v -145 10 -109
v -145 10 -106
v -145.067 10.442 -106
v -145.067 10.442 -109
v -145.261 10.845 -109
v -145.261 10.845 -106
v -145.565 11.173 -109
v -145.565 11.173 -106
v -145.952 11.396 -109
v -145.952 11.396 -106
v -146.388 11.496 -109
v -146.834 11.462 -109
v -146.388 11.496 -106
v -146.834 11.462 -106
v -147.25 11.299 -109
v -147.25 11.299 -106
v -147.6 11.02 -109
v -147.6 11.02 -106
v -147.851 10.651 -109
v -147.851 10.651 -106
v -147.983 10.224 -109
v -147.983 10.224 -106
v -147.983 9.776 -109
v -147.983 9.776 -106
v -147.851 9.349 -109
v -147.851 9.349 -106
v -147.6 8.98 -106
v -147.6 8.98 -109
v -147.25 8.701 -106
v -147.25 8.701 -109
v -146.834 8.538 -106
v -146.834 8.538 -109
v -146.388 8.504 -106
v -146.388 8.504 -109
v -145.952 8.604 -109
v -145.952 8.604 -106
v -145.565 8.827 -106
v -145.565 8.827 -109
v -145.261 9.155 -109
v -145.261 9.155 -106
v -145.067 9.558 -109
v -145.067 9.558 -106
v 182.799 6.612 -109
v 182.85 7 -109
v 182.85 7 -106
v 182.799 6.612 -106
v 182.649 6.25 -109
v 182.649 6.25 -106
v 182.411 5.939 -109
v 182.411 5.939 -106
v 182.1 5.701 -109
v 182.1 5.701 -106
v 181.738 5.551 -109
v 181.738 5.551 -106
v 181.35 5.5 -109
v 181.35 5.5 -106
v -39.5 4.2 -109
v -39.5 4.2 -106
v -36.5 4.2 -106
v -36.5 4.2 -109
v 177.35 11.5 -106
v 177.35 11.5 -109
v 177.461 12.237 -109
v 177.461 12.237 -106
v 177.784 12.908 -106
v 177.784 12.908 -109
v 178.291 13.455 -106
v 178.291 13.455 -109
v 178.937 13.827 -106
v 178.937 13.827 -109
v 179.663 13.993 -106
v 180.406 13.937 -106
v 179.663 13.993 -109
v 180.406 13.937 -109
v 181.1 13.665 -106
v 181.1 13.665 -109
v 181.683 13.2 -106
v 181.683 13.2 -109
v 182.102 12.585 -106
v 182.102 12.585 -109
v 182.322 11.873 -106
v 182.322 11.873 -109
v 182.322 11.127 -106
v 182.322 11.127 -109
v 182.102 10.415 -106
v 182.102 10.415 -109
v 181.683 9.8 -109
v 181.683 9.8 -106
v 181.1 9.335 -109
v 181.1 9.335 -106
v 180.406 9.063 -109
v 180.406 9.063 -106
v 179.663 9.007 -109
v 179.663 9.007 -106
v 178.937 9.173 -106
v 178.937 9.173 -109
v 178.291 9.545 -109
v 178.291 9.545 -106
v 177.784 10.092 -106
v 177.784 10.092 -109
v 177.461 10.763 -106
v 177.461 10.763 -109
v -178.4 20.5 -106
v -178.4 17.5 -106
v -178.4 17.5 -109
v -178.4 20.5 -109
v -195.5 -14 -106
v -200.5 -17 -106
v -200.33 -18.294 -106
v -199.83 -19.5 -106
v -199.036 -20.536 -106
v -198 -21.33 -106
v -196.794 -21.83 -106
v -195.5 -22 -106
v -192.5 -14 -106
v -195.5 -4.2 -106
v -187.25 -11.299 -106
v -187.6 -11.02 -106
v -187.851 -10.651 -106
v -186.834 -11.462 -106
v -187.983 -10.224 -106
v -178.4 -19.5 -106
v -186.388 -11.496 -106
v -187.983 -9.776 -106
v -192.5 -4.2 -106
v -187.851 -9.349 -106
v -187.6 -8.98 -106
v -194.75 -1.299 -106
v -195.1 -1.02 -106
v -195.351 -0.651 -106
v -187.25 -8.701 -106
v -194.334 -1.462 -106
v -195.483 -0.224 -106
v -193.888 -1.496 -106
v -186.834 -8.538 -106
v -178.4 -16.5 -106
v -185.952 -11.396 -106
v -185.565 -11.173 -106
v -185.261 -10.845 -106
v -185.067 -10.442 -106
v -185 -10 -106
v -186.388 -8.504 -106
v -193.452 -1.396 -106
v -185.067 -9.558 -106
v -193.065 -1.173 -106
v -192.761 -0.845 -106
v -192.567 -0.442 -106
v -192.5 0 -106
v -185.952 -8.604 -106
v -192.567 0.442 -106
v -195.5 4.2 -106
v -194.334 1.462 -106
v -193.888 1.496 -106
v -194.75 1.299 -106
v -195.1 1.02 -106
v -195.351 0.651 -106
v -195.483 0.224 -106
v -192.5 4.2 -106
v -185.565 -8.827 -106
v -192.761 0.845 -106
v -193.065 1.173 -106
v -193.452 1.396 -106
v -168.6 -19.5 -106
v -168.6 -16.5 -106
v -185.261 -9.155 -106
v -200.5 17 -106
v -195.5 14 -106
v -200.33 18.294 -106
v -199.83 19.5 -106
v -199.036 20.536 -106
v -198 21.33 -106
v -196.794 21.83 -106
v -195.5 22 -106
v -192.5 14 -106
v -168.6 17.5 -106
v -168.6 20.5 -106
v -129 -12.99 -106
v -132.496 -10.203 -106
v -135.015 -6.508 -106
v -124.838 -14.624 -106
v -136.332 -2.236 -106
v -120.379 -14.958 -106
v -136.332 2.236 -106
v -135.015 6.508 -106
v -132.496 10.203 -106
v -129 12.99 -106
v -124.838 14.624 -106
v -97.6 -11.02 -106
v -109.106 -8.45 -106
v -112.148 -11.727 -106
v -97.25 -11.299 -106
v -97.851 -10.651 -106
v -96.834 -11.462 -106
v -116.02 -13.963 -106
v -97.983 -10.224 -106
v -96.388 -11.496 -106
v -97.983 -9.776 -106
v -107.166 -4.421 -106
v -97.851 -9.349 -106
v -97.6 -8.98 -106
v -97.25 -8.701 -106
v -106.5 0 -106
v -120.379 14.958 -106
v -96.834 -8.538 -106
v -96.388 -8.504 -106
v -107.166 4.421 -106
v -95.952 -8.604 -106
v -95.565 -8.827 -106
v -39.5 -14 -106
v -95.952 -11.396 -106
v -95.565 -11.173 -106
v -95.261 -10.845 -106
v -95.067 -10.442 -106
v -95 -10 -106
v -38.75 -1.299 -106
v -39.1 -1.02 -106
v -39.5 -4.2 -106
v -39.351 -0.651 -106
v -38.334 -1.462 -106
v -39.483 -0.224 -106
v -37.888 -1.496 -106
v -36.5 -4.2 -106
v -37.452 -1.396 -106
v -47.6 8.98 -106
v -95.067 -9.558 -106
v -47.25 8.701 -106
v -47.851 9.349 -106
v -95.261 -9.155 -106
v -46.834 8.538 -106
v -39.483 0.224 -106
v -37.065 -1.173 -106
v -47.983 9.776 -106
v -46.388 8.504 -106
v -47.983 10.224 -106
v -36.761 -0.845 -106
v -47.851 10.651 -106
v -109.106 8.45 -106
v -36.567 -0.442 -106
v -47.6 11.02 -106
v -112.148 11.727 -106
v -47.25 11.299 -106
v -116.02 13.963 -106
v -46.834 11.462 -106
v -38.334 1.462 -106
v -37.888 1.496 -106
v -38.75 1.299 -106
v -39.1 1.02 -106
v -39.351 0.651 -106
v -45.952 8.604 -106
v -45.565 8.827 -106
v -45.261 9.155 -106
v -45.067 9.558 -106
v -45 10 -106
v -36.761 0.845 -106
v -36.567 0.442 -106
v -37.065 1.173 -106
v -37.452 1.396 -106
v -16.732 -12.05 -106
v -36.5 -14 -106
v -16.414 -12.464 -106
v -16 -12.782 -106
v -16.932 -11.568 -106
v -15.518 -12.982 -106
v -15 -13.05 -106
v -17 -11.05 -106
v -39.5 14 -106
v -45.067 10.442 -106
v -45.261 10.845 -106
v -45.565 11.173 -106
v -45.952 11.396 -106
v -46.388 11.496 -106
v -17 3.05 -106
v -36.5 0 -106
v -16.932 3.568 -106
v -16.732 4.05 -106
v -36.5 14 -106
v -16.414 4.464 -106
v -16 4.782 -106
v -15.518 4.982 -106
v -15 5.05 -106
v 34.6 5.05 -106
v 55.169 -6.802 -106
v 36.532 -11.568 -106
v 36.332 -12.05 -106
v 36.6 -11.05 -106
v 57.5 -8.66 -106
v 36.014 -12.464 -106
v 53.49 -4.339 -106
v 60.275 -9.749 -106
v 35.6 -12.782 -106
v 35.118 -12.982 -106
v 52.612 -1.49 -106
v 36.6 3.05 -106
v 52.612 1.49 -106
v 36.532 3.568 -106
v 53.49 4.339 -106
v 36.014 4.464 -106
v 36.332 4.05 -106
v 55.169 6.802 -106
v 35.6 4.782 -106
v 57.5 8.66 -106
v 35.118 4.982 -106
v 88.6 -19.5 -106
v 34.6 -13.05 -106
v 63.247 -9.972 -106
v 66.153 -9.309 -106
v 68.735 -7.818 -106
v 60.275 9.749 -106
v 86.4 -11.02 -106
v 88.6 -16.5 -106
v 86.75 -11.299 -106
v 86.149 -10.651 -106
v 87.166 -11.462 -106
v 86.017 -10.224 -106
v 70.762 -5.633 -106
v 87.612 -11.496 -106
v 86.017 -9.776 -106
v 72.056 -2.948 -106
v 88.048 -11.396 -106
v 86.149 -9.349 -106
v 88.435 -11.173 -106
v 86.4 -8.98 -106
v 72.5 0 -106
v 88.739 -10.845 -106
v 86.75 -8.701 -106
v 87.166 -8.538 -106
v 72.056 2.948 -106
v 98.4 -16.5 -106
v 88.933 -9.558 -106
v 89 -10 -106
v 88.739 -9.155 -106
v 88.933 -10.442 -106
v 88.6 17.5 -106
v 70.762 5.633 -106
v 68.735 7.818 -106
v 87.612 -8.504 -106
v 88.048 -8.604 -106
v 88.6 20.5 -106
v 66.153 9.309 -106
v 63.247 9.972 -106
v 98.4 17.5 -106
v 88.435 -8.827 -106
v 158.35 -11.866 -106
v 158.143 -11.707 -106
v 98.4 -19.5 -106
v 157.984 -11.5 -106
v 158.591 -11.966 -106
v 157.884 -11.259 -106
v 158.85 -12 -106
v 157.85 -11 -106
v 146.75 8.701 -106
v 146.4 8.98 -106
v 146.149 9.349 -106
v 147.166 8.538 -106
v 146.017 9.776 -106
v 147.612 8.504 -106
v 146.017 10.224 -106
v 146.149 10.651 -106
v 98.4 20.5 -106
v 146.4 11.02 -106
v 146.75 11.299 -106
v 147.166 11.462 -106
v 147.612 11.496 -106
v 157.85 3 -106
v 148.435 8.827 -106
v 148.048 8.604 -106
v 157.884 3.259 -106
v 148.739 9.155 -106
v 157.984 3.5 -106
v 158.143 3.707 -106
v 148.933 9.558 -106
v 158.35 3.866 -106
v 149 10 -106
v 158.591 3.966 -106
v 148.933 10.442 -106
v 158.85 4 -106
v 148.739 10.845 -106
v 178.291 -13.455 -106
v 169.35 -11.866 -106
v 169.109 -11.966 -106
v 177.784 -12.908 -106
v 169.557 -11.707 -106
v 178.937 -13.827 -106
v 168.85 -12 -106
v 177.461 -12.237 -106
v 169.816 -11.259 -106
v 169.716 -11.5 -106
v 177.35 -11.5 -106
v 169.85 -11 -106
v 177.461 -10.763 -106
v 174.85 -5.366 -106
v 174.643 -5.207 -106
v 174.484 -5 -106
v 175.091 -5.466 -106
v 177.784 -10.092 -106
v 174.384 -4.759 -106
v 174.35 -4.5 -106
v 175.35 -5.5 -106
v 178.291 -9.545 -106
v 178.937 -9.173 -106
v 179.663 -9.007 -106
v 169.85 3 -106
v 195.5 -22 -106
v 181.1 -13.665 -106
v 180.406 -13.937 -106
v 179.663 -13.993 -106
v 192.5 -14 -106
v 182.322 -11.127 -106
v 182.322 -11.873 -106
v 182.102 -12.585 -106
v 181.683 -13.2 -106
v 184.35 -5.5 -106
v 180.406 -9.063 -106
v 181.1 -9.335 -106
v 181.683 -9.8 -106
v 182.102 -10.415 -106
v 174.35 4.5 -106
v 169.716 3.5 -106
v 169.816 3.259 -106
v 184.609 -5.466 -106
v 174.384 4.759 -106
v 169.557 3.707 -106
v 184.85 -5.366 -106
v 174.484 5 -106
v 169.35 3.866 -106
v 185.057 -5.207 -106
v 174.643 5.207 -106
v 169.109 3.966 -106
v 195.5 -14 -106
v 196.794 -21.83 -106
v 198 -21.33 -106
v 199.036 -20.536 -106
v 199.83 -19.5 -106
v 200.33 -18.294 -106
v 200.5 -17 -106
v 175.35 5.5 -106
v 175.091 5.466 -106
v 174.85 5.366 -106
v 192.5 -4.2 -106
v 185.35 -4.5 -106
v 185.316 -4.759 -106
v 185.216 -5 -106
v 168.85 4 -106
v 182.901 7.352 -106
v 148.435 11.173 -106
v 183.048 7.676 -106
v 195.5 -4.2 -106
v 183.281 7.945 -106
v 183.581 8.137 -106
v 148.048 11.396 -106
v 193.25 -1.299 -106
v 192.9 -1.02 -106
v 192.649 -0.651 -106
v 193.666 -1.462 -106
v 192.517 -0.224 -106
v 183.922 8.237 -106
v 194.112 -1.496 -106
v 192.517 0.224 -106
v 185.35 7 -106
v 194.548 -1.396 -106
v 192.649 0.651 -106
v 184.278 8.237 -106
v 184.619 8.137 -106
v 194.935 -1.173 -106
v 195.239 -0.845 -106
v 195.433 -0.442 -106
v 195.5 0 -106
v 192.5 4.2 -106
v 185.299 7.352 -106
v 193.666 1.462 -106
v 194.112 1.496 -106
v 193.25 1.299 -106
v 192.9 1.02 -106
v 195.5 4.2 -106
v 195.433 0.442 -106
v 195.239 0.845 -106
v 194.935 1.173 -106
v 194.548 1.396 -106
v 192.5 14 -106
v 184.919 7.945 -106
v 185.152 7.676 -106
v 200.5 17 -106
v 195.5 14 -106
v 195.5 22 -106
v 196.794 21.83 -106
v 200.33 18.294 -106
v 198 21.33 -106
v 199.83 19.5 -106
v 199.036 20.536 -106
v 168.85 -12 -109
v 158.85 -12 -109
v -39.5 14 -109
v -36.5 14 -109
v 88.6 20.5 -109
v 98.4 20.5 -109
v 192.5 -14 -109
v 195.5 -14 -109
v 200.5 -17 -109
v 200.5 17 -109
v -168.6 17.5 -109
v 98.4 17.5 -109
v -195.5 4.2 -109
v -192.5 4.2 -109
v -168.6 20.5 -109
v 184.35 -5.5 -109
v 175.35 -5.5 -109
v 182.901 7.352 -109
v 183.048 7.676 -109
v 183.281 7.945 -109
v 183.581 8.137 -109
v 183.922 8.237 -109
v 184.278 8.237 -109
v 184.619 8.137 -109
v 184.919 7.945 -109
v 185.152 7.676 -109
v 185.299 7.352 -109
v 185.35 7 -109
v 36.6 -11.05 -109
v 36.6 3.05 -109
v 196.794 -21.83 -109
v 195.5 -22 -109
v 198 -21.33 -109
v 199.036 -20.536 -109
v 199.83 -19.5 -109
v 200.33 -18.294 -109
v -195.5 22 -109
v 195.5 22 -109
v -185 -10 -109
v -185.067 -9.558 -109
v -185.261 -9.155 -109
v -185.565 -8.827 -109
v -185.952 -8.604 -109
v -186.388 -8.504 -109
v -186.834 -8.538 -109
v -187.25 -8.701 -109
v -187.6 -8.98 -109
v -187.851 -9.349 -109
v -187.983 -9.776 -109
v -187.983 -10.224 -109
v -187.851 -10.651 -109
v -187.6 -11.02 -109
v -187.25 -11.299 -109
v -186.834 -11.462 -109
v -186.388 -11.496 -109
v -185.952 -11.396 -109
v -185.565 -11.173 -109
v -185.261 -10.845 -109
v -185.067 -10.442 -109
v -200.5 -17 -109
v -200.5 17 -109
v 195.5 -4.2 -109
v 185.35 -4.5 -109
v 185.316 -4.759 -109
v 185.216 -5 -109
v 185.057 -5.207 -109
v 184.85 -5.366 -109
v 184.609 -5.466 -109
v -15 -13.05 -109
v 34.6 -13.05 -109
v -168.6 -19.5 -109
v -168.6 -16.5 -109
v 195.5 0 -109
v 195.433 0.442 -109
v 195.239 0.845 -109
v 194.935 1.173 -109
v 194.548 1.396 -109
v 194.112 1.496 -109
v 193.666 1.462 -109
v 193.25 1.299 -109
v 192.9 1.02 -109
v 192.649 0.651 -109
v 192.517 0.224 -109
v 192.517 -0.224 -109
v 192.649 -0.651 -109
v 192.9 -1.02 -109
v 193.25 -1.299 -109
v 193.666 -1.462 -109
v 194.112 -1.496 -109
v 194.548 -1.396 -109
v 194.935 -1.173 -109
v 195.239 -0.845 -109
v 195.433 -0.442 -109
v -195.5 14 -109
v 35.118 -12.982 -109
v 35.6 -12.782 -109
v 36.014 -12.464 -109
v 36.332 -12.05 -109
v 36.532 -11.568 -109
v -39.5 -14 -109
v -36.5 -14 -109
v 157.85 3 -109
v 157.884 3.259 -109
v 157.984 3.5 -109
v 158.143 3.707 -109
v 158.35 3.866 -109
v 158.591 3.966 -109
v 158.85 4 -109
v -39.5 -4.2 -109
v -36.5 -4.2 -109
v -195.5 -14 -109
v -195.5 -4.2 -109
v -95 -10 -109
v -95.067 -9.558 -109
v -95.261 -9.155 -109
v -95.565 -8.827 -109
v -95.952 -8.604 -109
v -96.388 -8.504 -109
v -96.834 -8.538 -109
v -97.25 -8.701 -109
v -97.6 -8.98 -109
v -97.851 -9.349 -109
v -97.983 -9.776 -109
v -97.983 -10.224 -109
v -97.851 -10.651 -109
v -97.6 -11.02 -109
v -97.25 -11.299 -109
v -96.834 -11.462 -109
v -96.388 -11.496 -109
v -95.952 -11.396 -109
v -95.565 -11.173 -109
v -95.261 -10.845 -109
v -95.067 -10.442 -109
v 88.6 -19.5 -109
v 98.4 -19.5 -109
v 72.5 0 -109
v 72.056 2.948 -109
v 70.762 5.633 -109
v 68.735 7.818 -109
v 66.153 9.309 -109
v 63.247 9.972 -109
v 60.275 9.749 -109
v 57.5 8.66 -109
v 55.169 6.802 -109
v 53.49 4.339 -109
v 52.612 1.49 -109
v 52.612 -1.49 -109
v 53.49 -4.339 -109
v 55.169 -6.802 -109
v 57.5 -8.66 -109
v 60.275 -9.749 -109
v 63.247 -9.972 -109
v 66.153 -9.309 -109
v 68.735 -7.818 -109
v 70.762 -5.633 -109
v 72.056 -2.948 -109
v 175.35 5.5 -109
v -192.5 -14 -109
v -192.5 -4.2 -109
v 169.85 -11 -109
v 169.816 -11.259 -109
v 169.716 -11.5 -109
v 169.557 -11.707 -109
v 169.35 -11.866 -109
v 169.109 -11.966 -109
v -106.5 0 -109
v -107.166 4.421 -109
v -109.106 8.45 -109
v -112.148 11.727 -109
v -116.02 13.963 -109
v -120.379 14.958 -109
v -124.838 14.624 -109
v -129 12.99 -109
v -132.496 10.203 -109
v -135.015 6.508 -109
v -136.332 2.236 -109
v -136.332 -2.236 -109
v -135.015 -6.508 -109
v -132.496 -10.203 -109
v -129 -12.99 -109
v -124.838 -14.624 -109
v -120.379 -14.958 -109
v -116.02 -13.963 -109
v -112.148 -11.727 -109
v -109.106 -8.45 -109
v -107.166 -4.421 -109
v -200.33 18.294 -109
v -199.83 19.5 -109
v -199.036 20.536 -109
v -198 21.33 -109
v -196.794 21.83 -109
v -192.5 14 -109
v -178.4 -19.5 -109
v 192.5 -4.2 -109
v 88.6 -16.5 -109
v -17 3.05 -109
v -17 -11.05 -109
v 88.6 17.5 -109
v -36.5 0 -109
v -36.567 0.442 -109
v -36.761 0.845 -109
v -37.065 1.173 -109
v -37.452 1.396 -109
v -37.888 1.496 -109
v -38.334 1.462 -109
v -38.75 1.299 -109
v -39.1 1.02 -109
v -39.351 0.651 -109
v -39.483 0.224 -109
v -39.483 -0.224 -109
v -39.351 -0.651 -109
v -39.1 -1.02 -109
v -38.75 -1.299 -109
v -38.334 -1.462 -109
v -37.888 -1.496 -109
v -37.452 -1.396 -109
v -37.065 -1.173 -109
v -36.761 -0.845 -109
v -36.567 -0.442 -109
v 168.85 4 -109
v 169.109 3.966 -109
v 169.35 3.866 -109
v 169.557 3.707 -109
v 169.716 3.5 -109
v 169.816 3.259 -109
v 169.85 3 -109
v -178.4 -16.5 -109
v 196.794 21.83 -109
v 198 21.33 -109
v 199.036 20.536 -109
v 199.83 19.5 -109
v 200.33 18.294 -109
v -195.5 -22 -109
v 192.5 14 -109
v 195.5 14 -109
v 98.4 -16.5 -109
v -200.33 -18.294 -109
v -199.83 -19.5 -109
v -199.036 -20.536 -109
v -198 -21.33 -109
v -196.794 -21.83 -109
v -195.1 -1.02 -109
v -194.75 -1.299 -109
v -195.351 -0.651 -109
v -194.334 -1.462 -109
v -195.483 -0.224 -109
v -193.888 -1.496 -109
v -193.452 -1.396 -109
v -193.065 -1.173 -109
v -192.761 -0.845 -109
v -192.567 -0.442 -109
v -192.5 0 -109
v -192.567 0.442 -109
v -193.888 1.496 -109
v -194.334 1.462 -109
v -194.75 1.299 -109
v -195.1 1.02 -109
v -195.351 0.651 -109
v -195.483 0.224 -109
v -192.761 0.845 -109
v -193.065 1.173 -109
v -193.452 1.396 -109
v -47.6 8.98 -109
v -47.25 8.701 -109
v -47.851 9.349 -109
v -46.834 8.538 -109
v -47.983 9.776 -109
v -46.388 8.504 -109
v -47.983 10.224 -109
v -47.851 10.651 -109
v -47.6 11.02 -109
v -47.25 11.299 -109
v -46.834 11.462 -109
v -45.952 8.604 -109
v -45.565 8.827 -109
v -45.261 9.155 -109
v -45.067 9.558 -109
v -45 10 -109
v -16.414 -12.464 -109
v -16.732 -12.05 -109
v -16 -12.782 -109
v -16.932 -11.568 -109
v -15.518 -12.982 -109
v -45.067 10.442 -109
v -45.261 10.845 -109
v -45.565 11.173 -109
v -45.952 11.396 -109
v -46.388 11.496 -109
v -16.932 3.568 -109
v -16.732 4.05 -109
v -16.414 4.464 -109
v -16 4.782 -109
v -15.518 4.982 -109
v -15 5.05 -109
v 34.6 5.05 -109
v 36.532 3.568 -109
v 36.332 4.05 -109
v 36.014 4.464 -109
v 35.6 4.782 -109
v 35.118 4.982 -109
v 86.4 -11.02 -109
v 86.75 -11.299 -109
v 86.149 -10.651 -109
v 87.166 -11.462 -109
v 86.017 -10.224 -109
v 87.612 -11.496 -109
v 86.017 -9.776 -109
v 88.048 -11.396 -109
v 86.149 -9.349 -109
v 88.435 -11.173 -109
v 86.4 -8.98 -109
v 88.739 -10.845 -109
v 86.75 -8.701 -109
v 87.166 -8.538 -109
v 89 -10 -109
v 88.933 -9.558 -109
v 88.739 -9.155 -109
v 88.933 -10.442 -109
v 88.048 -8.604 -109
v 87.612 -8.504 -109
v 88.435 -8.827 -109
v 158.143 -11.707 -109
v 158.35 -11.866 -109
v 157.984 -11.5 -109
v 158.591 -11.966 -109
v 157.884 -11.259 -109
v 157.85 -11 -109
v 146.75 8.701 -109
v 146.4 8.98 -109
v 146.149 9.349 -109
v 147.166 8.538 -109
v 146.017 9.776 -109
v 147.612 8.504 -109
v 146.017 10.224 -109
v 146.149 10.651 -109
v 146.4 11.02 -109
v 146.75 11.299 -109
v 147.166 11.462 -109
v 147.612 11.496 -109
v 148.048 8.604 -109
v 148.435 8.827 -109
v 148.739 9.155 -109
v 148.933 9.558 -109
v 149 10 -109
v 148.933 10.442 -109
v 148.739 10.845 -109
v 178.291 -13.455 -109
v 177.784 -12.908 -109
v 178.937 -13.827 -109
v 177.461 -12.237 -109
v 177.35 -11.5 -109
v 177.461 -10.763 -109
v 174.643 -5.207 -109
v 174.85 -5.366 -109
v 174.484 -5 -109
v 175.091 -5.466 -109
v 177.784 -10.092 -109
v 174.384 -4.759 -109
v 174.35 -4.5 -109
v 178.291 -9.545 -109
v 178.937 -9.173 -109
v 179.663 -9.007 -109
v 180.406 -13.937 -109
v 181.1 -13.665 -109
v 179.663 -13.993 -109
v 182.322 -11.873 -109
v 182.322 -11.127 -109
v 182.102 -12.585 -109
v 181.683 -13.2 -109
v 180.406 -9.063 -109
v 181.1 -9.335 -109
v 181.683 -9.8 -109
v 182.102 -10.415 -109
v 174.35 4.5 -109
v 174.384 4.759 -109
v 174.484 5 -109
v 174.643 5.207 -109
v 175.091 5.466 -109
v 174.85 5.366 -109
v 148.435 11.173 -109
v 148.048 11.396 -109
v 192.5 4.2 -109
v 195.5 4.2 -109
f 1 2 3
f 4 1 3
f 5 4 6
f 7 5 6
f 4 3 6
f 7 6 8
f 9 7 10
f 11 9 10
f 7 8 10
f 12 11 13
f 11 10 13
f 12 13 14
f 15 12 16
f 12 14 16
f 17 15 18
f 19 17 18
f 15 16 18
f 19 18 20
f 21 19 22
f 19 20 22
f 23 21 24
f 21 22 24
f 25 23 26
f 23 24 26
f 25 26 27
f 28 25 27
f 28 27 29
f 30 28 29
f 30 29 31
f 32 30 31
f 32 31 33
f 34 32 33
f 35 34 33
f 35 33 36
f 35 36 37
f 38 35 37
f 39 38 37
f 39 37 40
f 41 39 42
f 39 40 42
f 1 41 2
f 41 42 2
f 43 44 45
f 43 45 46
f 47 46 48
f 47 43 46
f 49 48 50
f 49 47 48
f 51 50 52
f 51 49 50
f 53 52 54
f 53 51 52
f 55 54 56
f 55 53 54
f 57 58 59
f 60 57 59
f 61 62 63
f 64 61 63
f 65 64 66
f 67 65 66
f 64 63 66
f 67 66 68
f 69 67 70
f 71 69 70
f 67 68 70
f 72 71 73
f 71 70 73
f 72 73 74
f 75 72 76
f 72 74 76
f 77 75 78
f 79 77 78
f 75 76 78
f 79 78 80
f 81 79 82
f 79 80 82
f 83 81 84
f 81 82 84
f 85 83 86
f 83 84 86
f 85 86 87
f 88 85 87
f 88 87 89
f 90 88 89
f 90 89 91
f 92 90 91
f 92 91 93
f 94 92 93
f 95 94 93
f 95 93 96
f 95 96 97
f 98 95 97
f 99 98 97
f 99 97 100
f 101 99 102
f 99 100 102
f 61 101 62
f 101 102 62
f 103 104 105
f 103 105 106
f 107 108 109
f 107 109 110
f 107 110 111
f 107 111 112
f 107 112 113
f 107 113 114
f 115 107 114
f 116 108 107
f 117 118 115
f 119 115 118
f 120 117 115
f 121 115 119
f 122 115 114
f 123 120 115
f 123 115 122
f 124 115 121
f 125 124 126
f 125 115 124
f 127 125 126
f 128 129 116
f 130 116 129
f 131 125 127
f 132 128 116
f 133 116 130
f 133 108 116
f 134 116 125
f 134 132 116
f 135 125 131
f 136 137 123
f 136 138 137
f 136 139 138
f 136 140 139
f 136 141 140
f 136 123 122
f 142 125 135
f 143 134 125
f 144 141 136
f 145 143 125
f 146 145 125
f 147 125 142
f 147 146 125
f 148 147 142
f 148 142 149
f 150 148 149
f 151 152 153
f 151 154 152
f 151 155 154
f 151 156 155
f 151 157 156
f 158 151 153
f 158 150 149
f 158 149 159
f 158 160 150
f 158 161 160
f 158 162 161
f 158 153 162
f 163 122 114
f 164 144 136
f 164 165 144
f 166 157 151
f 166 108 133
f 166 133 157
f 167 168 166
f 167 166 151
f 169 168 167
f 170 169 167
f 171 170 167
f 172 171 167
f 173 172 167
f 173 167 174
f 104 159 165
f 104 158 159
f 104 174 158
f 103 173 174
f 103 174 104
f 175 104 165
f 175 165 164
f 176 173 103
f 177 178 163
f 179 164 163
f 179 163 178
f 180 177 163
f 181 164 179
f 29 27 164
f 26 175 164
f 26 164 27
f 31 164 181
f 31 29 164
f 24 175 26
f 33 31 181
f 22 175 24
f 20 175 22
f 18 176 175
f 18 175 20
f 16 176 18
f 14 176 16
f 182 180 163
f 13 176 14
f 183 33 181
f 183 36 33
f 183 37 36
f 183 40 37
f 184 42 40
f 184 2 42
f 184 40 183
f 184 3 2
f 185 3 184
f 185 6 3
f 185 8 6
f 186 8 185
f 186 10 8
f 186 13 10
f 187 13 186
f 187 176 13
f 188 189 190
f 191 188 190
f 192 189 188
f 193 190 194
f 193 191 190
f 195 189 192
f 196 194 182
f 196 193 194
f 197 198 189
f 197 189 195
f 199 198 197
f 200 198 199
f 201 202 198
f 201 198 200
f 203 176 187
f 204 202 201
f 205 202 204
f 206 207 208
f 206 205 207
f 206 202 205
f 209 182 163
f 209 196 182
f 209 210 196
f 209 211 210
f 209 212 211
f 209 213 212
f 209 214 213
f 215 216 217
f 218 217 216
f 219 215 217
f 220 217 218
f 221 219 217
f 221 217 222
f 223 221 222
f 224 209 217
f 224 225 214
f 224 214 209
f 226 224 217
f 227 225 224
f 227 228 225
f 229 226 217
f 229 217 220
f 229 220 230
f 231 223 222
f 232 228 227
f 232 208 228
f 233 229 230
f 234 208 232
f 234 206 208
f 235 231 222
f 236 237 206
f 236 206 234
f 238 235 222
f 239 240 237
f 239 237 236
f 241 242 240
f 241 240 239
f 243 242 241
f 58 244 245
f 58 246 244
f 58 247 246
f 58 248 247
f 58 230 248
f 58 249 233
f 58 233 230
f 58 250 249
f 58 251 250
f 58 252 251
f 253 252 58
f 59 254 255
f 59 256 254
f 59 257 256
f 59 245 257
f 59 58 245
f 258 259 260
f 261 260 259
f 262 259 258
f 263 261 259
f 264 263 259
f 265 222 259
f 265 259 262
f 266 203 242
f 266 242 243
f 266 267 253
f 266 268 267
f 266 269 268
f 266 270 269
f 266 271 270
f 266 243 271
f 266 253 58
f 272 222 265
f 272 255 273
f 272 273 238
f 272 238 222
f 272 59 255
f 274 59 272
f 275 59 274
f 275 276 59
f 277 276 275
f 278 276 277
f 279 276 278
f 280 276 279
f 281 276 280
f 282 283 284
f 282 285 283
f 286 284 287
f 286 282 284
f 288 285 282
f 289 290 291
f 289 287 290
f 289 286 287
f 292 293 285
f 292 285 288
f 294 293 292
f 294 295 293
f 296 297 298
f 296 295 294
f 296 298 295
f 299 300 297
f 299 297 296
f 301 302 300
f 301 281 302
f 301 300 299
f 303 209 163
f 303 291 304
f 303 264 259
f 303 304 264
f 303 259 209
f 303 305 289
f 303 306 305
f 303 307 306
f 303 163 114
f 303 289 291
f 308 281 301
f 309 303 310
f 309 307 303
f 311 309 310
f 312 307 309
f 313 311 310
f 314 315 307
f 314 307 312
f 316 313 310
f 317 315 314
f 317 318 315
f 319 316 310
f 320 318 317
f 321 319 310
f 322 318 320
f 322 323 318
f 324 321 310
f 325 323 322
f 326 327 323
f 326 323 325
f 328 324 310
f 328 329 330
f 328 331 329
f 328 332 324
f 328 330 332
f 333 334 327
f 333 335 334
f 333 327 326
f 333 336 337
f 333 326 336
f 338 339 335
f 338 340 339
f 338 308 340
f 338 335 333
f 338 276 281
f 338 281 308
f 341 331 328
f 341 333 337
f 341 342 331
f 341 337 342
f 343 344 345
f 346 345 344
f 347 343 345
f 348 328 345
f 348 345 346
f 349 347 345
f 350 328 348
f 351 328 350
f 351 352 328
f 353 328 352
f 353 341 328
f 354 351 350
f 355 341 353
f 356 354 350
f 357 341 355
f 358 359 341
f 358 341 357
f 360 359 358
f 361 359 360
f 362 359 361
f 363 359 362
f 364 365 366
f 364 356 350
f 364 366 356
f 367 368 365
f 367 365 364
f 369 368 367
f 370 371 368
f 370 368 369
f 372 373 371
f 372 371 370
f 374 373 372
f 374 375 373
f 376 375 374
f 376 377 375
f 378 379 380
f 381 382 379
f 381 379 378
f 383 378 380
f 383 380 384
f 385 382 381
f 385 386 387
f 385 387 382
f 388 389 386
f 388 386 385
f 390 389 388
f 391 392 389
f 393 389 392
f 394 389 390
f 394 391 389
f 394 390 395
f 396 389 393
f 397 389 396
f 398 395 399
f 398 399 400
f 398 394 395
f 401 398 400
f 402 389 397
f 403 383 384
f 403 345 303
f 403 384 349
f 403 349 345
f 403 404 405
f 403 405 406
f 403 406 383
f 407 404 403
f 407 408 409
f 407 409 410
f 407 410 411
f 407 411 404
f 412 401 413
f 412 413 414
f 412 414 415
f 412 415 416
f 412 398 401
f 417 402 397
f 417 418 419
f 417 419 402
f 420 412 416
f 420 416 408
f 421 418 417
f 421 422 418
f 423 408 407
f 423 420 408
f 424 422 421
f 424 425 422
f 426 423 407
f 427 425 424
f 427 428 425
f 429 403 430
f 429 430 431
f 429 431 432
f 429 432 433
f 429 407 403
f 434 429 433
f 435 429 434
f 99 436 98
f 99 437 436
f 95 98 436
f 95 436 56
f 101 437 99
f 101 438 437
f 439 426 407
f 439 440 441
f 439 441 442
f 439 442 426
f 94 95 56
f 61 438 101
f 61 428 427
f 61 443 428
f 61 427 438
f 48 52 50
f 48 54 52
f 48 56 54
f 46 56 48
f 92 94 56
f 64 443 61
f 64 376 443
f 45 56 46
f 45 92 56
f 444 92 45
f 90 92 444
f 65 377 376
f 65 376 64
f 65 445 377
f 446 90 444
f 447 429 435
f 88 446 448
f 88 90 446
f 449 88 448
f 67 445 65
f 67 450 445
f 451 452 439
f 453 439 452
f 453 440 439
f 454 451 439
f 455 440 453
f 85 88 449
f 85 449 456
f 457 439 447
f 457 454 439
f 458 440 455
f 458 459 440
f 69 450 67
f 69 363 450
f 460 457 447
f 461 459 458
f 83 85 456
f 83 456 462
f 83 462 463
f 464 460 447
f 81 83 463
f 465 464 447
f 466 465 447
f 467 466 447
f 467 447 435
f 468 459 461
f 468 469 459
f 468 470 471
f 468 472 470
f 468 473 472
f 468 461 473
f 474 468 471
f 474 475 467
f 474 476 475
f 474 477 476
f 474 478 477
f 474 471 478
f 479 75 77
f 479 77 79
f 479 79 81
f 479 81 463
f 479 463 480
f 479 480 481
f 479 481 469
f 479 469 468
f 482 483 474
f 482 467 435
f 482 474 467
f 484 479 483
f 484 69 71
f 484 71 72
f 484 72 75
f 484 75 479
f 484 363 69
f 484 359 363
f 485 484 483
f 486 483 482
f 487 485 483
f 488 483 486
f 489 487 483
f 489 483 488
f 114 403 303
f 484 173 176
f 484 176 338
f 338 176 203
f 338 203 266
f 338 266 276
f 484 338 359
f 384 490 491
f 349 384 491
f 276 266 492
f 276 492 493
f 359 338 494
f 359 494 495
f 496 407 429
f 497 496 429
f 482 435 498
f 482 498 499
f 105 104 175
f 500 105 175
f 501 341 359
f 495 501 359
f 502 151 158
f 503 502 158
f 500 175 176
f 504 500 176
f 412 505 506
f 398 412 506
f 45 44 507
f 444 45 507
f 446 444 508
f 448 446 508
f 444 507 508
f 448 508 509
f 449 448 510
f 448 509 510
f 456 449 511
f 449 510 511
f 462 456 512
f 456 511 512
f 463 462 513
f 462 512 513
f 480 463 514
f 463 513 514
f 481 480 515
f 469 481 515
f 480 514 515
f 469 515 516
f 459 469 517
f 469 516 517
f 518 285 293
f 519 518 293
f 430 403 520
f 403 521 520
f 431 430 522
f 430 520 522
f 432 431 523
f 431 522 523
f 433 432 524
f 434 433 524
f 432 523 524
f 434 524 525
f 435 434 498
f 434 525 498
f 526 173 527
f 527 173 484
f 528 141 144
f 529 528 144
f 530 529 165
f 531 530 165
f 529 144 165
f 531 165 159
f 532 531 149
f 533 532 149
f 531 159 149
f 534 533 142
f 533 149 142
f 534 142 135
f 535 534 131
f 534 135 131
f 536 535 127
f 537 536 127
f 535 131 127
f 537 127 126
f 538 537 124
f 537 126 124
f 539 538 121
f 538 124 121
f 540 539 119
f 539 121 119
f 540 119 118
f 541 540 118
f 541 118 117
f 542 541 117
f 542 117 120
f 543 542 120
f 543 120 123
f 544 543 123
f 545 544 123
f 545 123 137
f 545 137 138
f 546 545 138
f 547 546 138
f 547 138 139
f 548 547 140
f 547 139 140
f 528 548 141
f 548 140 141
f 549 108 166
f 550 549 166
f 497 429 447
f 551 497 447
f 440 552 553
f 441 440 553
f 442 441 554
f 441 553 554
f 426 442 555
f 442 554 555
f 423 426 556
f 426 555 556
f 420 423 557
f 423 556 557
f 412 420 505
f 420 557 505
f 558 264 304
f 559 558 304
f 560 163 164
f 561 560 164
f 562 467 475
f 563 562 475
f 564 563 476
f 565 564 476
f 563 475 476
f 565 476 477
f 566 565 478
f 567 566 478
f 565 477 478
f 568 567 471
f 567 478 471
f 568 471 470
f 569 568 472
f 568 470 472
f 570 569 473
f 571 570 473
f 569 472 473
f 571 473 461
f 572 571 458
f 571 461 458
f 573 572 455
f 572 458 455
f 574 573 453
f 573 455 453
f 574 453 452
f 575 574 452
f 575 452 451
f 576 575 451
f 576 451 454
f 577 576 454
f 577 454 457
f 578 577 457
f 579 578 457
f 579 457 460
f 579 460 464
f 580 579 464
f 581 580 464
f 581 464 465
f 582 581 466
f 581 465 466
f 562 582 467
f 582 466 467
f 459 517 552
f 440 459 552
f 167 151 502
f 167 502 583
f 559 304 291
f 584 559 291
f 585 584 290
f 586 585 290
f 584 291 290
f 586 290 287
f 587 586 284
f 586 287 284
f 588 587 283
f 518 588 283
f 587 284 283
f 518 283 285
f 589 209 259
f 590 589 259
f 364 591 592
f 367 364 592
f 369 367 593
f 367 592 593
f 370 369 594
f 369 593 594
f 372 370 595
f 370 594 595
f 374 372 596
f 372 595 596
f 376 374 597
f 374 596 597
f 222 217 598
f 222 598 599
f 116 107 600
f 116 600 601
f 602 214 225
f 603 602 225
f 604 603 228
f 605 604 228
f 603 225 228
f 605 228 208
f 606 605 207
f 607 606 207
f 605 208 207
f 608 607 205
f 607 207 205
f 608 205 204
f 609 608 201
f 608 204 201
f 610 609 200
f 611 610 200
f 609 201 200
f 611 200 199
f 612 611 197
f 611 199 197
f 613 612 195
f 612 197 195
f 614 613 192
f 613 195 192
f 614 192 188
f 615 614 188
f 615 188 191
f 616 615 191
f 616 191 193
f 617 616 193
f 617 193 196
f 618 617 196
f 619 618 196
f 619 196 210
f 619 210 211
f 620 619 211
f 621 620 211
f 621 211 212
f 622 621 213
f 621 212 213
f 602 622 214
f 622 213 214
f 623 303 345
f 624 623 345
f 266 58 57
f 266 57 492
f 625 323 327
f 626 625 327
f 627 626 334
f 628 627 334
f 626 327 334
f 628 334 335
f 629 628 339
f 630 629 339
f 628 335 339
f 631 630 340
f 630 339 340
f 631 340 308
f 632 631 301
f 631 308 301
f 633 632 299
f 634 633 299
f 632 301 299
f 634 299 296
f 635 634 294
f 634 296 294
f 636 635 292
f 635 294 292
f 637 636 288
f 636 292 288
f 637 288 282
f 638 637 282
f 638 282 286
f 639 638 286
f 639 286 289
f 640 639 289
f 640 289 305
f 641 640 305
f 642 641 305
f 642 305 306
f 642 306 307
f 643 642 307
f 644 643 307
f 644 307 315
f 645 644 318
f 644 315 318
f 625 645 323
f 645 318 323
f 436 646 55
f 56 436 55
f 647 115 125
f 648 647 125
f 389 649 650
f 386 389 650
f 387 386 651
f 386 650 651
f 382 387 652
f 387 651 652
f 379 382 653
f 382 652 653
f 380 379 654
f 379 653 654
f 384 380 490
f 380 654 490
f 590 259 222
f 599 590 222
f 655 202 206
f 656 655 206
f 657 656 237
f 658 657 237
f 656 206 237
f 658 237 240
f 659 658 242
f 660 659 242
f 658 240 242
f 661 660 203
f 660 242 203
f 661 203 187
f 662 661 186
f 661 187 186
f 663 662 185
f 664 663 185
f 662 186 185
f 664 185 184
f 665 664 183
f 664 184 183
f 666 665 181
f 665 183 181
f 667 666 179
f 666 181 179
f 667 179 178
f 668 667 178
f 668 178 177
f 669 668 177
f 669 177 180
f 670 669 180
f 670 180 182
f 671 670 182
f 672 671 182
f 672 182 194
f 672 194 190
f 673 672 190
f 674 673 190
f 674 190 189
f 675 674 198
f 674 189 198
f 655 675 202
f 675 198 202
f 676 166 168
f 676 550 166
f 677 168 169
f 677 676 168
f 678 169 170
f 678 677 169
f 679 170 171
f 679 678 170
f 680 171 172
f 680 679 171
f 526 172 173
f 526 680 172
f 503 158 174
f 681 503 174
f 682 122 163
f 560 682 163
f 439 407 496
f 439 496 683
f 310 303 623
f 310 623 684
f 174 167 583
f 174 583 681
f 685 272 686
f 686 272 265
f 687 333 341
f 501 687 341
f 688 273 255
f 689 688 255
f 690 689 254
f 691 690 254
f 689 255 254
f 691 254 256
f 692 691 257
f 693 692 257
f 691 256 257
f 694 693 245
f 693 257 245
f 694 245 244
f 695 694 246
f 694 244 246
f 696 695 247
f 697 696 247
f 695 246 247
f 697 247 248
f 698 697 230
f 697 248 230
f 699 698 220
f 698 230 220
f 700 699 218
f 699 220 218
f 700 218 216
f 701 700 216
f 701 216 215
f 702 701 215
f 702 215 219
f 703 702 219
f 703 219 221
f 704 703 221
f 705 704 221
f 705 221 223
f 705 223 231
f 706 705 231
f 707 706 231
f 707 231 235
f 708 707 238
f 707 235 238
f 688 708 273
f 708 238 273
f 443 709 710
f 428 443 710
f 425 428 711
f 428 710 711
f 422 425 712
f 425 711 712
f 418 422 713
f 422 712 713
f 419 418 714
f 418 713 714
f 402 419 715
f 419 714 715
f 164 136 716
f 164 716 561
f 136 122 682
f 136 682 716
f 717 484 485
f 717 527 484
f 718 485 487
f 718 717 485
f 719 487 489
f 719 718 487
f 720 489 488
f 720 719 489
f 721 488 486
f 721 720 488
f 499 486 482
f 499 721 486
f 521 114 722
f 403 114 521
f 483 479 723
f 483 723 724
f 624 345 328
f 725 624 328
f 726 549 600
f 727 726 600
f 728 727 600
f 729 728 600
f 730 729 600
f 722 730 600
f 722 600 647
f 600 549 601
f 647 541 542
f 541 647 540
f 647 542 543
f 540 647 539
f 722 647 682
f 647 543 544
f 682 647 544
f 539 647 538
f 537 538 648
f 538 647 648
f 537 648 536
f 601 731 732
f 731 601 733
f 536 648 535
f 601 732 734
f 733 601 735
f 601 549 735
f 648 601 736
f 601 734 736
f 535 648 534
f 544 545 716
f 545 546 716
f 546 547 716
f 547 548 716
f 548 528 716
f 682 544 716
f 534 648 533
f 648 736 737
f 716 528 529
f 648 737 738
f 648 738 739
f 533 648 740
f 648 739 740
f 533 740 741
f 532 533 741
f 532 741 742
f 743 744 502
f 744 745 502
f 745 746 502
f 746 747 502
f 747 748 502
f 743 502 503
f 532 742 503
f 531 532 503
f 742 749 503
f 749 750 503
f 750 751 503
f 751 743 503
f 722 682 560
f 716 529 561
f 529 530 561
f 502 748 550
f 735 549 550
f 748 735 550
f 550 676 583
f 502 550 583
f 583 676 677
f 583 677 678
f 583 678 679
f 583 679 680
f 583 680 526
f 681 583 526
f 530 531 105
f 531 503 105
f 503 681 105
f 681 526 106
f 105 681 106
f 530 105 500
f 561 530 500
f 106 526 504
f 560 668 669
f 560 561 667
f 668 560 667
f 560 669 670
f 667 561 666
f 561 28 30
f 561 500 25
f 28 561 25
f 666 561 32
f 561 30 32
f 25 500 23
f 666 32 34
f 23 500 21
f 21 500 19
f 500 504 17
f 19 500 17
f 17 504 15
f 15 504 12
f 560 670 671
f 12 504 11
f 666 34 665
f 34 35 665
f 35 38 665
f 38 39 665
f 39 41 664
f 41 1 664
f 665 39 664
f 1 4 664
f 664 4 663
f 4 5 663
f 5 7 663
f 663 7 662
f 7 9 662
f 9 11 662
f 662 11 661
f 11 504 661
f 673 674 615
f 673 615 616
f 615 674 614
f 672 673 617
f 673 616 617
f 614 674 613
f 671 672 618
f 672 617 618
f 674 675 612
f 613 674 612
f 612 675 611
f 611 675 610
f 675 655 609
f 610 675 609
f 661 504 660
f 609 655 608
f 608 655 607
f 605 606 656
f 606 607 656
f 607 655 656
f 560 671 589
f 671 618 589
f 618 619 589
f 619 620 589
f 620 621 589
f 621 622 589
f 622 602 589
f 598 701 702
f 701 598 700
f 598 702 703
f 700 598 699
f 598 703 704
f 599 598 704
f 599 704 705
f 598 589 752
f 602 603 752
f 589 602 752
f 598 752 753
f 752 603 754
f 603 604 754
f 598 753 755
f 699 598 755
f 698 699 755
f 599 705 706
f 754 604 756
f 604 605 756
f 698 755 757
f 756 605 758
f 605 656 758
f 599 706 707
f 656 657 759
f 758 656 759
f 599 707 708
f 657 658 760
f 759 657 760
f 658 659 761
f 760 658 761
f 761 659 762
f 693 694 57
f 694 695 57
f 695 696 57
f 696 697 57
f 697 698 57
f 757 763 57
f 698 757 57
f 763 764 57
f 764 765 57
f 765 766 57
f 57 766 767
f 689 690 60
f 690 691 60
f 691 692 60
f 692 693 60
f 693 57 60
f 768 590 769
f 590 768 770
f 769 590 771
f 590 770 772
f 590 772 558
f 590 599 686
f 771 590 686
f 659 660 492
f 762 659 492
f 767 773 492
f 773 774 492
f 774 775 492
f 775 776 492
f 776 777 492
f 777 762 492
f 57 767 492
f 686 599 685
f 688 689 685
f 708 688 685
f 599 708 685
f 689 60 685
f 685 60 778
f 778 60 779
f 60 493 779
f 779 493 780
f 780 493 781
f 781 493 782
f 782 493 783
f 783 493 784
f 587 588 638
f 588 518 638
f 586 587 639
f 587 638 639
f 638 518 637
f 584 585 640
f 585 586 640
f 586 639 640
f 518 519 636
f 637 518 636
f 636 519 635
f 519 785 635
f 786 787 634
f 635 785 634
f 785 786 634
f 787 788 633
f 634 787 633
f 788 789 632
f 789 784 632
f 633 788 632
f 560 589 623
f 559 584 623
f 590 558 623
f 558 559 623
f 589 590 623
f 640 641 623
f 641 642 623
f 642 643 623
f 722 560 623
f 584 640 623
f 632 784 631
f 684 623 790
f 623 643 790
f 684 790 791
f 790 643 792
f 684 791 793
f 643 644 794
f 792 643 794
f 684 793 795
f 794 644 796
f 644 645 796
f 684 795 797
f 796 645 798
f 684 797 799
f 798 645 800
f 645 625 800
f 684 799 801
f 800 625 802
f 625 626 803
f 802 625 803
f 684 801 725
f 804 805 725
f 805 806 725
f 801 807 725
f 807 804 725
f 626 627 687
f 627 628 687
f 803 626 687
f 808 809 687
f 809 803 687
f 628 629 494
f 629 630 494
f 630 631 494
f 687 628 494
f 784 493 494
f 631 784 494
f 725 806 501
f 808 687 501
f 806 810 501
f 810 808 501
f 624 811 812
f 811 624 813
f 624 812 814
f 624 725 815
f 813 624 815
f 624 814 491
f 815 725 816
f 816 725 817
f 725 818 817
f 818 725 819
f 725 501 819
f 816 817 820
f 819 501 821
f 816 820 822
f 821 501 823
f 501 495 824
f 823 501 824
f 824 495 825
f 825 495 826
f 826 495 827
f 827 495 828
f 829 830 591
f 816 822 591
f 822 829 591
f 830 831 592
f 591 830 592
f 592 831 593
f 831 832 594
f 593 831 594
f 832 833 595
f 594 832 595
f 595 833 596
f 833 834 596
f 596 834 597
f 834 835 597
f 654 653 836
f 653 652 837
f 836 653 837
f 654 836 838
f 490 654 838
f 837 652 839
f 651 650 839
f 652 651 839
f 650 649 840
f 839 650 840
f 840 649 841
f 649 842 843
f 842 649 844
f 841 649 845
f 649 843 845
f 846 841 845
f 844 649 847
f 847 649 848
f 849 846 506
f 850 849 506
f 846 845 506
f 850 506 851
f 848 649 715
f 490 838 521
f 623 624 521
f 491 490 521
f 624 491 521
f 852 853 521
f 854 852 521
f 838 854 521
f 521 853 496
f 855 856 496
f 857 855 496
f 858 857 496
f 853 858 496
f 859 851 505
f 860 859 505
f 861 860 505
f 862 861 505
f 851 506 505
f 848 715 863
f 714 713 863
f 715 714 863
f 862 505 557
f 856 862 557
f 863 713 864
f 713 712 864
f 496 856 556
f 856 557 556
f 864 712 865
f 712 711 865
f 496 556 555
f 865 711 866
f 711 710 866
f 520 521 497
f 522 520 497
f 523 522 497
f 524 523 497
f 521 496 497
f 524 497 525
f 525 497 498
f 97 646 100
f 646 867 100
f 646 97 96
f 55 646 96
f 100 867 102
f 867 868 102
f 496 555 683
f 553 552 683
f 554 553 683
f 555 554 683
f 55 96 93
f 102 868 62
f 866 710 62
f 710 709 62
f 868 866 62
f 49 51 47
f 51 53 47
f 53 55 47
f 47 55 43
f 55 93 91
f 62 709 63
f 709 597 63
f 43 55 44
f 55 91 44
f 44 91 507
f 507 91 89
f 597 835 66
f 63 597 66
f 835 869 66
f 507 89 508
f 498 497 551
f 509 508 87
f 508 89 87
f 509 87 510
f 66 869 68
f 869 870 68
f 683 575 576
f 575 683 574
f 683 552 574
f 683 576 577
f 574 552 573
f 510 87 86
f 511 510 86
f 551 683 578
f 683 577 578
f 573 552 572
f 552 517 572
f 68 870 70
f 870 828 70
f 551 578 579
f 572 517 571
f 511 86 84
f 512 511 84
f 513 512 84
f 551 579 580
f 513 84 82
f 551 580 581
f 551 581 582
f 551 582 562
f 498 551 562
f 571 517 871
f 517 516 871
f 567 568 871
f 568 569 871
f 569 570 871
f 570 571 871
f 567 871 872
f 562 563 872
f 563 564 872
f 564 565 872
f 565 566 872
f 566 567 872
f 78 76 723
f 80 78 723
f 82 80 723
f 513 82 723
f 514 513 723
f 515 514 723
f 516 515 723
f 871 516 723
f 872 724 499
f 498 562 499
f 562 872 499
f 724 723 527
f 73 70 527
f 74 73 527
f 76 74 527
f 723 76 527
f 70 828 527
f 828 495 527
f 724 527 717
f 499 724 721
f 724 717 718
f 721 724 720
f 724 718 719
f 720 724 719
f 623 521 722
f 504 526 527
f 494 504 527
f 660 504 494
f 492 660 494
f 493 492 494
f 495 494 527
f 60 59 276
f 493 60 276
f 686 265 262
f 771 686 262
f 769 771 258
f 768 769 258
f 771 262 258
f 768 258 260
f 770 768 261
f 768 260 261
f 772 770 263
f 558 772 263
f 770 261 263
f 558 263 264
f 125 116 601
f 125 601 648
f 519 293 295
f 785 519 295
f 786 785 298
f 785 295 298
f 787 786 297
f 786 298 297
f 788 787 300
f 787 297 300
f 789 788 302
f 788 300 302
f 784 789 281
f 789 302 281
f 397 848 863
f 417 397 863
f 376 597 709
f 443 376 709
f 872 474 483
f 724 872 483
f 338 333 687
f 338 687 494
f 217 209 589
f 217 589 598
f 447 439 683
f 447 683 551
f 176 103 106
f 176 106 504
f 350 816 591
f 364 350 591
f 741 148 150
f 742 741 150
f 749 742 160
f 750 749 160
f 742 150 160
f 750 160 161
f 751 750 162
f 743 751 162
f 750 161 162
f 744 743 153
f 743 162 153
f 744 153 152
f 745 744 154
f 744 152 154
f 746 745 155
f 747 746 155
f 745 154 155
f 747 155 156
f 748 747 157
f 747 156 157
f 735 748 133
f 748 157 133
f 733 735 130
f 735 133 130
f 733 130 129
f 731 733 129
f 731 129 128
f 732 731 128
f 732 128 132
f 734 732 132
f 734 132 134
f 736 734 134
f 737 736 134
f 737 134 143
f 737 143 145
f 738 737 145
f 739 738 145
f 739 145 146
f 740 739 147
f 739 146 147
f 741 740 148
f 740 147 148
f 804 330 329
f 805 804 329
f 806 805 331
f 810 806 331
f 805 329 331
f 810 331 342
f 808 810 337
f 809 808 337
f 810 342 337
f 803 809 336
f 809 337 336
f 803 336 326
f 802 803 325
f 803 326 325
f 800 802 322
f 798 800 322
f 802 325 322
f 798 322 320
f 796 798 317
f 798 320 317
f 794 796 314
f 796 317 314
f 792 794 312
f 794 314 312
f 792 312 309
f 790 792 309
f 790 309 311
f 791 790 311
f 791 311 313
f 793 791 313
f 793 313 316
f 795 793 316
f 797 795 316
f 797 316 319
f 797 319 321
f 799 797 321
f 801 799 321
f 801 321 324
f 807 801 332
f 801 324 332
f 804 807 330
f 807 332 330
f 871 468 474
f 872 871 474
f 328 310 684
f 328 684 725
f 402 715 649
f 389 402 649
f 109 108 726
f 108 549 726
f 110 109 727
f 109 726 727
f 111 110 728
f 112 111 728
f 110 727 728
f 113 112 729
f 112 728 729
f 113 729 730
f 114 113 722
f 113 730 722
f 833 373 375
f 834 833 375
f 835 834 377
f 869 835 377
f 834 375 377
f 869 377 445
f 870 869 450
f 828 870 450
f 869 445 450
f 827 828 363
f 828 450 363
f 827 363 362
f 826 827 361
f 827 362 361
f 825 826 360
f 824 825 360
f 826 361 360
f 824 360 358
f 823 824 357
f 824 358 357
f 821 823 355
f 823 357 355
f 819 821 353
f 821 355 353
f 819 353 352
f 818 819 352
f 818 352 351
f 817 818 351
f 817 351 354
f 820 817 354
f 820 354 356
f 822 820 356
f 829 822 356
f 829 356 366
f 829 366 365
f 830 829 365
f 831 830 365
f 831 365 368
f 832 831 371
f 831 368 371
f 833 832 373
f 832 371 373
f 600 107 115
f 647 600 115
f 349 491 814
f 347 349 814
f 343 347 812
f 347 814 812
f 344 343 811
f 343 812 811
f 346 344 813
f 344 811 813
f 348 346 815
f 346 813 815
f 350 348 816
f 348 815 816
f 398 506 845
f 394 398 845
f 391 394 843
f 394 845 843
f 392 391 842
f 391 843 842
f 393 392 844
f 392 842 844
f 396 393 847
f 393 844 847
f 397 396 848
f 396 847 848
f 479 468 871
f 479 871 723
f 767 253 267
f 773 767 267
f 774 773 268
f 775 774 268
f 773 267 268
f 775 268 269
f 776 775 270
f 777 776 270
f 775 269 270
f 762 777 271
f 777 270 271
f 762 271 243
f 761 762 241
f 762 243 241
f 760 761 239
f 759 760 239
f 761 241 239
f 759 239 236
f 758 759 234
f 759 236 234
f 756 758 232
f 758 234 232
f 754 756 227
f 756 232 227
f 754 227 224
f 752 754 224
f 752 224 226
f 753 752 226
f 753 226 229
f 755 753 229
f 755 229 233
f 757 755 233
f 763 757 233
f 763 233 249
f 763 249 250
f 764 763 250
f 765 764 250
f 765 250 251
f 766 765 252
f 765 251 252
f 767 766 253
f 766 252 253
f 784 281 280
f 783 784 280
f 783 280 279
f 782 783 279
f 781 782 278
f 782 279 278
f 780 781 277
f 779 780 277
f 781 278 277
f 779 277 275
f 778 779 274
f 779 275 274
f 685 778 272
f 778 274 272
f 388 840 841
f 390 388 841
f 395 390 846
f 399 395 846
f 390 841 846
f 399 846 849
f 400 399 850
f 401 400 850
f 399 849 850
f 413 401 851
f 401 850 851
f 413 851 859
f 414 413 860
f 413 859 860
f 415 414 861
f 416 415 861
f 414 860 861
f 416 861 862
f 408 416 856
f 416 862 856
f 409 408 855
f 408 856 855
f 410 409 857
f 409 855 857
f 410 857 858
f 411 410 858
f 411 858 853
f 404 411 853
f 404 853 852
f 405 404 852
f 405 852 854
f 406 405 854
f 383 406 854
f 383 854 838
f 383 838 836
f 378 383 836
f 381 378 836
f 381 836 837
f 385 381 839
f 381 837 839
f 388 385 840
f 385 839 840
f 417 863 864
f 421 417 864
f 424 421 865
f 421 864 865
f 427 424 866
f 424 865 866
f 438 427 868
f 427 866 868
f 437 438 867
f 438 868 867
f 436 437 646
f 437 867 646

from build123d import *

# Parameters (mm, degrees)
SKETCH001002010_W         = 401
SKETCH001002010_H         = 44
SKETCH001002010_R         = 1.5
SKETCH001002010_R_2       = 15
SKETCH001002010_R_3       = 10
SKETCH001002010_W_2       = 3
SKETCH001002010_H_2       = 9.8
SKETCH001002010_W_3       = 9.8
SKETCH001002010_H_3       = 3
PAD015_DEPTH              = 3
POCKET009_DEPTH           = 3
SKETCH001002027_R         = 2.5
POCKET010_DEPTH           = 3
FILLET028_R               = 5
FILLET028_PLACEMENT_ANGLE = 90


with BuildPart() as part:
    # Sketch001002010 → Pad015 (new body)
    with BuildSketch(Plane.XZ.offset(-106)):
        Rectangle(SKETCH001002010_W, SKETCH001002010_H)
        with Locations((-194, 0)):
            Circle(SKETCH001002010_R, mode=Mode.SUBTRACT)
        with Locations((194, 0)):
            Circle(SKETCH001002010_R, mode=Mode.SUBTRACT)
        with Locations((-121.5, 0)):
            Circle(SKETCH001002010_R_2, mode=Mode.SUBTRACT)
        with Locations((-146.5, 10)):
            Circle(SKETCH001002010_R, mode=Mode.SUBTRACT)
        with Locations((-186.5, -10)):
            Circle(SKETCH001002010_R, mode=Mode.SUBTRACT)
        with Locations((87.5, -10)):
            Circle(SKETCH001002010_R, mode=Mode.SUBTRACT)
        with Locations((147.5, 10)):
            Circle(SKETCH001002010_R, mode=Mode.SUBTRACT)
        with Locations((-38, 0)):
            Circle(SKETCH001002010_R, mode=Mode.SUBTRACT)
        with Locations((-96.5, -10)):
            Circle(SKETCH001002010_R, mode=Mode.SUBTRACT)
        with Locations((-46.5, 10)):
            Circle(SKETCH001002010_R, mode=Mode.SUBTRACT)
        with Locations((62.5, 0)):
            Circle(SKETCH001002010_R_3, mode=Mode.SUBTRACT)
        with Locations((194, 9.1)):
            Rectangle(SKETCH001002010_W_2, SKETCH001002010_H_2, mode=Mode.SUBTRACT)
        with Locations((194, -9.1)):
            Rectangle(SKETCH001002010_W_2, SKETCH001002010_H_2, mode=Mode.SUBTRACT)
        with Locations((-194, 9.1)):
            Rectangle(SKETCH001002010_W_2, SKETCH001002010_H_2, mode=Mode.SUBTRACT)
        with Locations((-194, -9.1)):
            Rectangle(SKETCH001002010_W_2, SKETCH001002010_H_2, mode=Mode.SUBTRACT)
        with Locations((-173.5, -18)):
            Rectangle(SKETCH001002010_W_3, SKETCH001002010_H_3, mode=Mode.SUBTRACT)
        with Locations((93.5, -18)):
            Rectangle(SKETCH001002010_W_3, SKETCH001002010_H_3, mode=Mode.SUBTRACT)
        with Locations((-173.5, 19)):
            Rectangle(SKETCH001002010_W_3, SKETCH001002010_H_3, mode=Mode.SUBTRACT)
        with Locations((93.5, 19)):
            Rectangle(SKETCH001002010_W_3, SKETCH001002010_H_3, mode=Mode.SUBTRACT)
        with Locations((-38, 9.1)):
            Rectangle(SKETCH001002010_W_2, SKETCH001002010_H_2, mode=Mode.SUBTRACT)
        with Locations((-38, -9.1)):
            Rectangle(SKETCH001002010_W_2, SKETCH001002010_H_2, mode=Mode.SUBTRACT)
    extrude(amount=-PAD015_DEPTH)

    # Sketch001002026 → Pocket009 (cut)
    with BuildSketch(Plane.XZ.offset(-106)):
        with BuildLine():
            Line((-17, 3.05), (-17, -11.05))
            ThreePointArc((-17, -11.05), (-16.414214, -12.464214), (-15, -13.05))
            Line((-15, -13.05), (34.6, -13.05))
            ThreePointArc((34.6, -13.05), (36.014214, -12.464214), (36.6, -11.05))
            Line((36.6, -11.05), (36.6, 3.05))
            ThreePointArc((36.6, 3.05), (36.014214, 4.464214), (34.6, 5.05))
            Line((34.6, 5.05), (-15, 5.05))
            ThreePointArc((-15, 5.05), (-16.414214, 4.464214), (-17, 3.05))
        make_face()
    extrude(amount=-POCKET009_DEPTH, mode=Mode.SUBTRACT)

    # Sketch001002027 → Pocket010 (cut)
    with BuildSketch(Plane(origin=(0, 109, 0), x_dir=(-1, 0, 0), z_dir=(0, 1, 0))):
        with Locations((-179.85, 11.5)):
            Circle(SKETCH001002027_R)
        with Locations((-179.85, -11.5)):
            Circle(SKETCH001002027_R)
        with BuildLine():
            Line((-185.35, 7), (-185.35, -4.5))
            ThreePointArc((-185.35, -4.5), (-185.057107, -5.207107), (-184.35, -5.5))
            Line((-184.35, -5.5), (-175.35, -5.5))
            ThreePointArc((-175.35, -5.5), (-174.642893, -5.207107), (-174.35, -4.5))
            Line((-174.35, -4.5), (-174.35, 4.5))
            ThreePointArc((-174.35, 4.5), (-174.642893, 5.207107), (-175.35, 5.5))
            Line((-175.35, 5.5), (-181.35, 5.5))
            ThreePointArc((-182.85, 7), (-182.41066, 5.93934), (-181.35, 5.5))
            ThreePointArc((-182.85, 7), (-184.1, 8.25), (-185.35, 7))
        make_face()
        with BuildLine():
            Line((-169.85, 3), (-169.85, -11))
            ThreePointArc((-169.85, -11), (-169.557107, -11.707107), (-168.85, -12))
            Line((-168.85, -12), (-158.85, -12))
            ThreePointArc((-158.85, -12), (-158.142893, -11.707107), (-157.85, -11))
            Line((-157.85, -11), (-157.85, 3))
            ThreePointArc((-157.85, 3), (-158.142893, 3.707107), (-158.85, 4))
            Line((-158.85, 4), (-168.85, 4))
            ThreePointArc((-168.85, 4), (-169.557107, 3.707107), (-169.85, 3))
        make_face()
    extrude(amount=-POCKET010_DEPTH, mode=Mode.SUBTRACT)

    # Fillet028
    fillet028_edges = [part.edges().sort_by_distance(p)[0] for p in [
        (-200.5, 107.5, 22),
        (200.5, 107.5, 22),
        (-200.5, 107.5, -22),
        (200.5, 107.5, -22),
    ]]
    fillet(fillet028_edges, radius=FILLET028_R)


with BuildPart() as part_1:
    # Fillet028 placement: moved
    add(part.part.rotate(Axis((0, 0, 0), (-1, 0, 0)), FILLET028_PLACEMENT_ANGLE))


solid = part_1.part
